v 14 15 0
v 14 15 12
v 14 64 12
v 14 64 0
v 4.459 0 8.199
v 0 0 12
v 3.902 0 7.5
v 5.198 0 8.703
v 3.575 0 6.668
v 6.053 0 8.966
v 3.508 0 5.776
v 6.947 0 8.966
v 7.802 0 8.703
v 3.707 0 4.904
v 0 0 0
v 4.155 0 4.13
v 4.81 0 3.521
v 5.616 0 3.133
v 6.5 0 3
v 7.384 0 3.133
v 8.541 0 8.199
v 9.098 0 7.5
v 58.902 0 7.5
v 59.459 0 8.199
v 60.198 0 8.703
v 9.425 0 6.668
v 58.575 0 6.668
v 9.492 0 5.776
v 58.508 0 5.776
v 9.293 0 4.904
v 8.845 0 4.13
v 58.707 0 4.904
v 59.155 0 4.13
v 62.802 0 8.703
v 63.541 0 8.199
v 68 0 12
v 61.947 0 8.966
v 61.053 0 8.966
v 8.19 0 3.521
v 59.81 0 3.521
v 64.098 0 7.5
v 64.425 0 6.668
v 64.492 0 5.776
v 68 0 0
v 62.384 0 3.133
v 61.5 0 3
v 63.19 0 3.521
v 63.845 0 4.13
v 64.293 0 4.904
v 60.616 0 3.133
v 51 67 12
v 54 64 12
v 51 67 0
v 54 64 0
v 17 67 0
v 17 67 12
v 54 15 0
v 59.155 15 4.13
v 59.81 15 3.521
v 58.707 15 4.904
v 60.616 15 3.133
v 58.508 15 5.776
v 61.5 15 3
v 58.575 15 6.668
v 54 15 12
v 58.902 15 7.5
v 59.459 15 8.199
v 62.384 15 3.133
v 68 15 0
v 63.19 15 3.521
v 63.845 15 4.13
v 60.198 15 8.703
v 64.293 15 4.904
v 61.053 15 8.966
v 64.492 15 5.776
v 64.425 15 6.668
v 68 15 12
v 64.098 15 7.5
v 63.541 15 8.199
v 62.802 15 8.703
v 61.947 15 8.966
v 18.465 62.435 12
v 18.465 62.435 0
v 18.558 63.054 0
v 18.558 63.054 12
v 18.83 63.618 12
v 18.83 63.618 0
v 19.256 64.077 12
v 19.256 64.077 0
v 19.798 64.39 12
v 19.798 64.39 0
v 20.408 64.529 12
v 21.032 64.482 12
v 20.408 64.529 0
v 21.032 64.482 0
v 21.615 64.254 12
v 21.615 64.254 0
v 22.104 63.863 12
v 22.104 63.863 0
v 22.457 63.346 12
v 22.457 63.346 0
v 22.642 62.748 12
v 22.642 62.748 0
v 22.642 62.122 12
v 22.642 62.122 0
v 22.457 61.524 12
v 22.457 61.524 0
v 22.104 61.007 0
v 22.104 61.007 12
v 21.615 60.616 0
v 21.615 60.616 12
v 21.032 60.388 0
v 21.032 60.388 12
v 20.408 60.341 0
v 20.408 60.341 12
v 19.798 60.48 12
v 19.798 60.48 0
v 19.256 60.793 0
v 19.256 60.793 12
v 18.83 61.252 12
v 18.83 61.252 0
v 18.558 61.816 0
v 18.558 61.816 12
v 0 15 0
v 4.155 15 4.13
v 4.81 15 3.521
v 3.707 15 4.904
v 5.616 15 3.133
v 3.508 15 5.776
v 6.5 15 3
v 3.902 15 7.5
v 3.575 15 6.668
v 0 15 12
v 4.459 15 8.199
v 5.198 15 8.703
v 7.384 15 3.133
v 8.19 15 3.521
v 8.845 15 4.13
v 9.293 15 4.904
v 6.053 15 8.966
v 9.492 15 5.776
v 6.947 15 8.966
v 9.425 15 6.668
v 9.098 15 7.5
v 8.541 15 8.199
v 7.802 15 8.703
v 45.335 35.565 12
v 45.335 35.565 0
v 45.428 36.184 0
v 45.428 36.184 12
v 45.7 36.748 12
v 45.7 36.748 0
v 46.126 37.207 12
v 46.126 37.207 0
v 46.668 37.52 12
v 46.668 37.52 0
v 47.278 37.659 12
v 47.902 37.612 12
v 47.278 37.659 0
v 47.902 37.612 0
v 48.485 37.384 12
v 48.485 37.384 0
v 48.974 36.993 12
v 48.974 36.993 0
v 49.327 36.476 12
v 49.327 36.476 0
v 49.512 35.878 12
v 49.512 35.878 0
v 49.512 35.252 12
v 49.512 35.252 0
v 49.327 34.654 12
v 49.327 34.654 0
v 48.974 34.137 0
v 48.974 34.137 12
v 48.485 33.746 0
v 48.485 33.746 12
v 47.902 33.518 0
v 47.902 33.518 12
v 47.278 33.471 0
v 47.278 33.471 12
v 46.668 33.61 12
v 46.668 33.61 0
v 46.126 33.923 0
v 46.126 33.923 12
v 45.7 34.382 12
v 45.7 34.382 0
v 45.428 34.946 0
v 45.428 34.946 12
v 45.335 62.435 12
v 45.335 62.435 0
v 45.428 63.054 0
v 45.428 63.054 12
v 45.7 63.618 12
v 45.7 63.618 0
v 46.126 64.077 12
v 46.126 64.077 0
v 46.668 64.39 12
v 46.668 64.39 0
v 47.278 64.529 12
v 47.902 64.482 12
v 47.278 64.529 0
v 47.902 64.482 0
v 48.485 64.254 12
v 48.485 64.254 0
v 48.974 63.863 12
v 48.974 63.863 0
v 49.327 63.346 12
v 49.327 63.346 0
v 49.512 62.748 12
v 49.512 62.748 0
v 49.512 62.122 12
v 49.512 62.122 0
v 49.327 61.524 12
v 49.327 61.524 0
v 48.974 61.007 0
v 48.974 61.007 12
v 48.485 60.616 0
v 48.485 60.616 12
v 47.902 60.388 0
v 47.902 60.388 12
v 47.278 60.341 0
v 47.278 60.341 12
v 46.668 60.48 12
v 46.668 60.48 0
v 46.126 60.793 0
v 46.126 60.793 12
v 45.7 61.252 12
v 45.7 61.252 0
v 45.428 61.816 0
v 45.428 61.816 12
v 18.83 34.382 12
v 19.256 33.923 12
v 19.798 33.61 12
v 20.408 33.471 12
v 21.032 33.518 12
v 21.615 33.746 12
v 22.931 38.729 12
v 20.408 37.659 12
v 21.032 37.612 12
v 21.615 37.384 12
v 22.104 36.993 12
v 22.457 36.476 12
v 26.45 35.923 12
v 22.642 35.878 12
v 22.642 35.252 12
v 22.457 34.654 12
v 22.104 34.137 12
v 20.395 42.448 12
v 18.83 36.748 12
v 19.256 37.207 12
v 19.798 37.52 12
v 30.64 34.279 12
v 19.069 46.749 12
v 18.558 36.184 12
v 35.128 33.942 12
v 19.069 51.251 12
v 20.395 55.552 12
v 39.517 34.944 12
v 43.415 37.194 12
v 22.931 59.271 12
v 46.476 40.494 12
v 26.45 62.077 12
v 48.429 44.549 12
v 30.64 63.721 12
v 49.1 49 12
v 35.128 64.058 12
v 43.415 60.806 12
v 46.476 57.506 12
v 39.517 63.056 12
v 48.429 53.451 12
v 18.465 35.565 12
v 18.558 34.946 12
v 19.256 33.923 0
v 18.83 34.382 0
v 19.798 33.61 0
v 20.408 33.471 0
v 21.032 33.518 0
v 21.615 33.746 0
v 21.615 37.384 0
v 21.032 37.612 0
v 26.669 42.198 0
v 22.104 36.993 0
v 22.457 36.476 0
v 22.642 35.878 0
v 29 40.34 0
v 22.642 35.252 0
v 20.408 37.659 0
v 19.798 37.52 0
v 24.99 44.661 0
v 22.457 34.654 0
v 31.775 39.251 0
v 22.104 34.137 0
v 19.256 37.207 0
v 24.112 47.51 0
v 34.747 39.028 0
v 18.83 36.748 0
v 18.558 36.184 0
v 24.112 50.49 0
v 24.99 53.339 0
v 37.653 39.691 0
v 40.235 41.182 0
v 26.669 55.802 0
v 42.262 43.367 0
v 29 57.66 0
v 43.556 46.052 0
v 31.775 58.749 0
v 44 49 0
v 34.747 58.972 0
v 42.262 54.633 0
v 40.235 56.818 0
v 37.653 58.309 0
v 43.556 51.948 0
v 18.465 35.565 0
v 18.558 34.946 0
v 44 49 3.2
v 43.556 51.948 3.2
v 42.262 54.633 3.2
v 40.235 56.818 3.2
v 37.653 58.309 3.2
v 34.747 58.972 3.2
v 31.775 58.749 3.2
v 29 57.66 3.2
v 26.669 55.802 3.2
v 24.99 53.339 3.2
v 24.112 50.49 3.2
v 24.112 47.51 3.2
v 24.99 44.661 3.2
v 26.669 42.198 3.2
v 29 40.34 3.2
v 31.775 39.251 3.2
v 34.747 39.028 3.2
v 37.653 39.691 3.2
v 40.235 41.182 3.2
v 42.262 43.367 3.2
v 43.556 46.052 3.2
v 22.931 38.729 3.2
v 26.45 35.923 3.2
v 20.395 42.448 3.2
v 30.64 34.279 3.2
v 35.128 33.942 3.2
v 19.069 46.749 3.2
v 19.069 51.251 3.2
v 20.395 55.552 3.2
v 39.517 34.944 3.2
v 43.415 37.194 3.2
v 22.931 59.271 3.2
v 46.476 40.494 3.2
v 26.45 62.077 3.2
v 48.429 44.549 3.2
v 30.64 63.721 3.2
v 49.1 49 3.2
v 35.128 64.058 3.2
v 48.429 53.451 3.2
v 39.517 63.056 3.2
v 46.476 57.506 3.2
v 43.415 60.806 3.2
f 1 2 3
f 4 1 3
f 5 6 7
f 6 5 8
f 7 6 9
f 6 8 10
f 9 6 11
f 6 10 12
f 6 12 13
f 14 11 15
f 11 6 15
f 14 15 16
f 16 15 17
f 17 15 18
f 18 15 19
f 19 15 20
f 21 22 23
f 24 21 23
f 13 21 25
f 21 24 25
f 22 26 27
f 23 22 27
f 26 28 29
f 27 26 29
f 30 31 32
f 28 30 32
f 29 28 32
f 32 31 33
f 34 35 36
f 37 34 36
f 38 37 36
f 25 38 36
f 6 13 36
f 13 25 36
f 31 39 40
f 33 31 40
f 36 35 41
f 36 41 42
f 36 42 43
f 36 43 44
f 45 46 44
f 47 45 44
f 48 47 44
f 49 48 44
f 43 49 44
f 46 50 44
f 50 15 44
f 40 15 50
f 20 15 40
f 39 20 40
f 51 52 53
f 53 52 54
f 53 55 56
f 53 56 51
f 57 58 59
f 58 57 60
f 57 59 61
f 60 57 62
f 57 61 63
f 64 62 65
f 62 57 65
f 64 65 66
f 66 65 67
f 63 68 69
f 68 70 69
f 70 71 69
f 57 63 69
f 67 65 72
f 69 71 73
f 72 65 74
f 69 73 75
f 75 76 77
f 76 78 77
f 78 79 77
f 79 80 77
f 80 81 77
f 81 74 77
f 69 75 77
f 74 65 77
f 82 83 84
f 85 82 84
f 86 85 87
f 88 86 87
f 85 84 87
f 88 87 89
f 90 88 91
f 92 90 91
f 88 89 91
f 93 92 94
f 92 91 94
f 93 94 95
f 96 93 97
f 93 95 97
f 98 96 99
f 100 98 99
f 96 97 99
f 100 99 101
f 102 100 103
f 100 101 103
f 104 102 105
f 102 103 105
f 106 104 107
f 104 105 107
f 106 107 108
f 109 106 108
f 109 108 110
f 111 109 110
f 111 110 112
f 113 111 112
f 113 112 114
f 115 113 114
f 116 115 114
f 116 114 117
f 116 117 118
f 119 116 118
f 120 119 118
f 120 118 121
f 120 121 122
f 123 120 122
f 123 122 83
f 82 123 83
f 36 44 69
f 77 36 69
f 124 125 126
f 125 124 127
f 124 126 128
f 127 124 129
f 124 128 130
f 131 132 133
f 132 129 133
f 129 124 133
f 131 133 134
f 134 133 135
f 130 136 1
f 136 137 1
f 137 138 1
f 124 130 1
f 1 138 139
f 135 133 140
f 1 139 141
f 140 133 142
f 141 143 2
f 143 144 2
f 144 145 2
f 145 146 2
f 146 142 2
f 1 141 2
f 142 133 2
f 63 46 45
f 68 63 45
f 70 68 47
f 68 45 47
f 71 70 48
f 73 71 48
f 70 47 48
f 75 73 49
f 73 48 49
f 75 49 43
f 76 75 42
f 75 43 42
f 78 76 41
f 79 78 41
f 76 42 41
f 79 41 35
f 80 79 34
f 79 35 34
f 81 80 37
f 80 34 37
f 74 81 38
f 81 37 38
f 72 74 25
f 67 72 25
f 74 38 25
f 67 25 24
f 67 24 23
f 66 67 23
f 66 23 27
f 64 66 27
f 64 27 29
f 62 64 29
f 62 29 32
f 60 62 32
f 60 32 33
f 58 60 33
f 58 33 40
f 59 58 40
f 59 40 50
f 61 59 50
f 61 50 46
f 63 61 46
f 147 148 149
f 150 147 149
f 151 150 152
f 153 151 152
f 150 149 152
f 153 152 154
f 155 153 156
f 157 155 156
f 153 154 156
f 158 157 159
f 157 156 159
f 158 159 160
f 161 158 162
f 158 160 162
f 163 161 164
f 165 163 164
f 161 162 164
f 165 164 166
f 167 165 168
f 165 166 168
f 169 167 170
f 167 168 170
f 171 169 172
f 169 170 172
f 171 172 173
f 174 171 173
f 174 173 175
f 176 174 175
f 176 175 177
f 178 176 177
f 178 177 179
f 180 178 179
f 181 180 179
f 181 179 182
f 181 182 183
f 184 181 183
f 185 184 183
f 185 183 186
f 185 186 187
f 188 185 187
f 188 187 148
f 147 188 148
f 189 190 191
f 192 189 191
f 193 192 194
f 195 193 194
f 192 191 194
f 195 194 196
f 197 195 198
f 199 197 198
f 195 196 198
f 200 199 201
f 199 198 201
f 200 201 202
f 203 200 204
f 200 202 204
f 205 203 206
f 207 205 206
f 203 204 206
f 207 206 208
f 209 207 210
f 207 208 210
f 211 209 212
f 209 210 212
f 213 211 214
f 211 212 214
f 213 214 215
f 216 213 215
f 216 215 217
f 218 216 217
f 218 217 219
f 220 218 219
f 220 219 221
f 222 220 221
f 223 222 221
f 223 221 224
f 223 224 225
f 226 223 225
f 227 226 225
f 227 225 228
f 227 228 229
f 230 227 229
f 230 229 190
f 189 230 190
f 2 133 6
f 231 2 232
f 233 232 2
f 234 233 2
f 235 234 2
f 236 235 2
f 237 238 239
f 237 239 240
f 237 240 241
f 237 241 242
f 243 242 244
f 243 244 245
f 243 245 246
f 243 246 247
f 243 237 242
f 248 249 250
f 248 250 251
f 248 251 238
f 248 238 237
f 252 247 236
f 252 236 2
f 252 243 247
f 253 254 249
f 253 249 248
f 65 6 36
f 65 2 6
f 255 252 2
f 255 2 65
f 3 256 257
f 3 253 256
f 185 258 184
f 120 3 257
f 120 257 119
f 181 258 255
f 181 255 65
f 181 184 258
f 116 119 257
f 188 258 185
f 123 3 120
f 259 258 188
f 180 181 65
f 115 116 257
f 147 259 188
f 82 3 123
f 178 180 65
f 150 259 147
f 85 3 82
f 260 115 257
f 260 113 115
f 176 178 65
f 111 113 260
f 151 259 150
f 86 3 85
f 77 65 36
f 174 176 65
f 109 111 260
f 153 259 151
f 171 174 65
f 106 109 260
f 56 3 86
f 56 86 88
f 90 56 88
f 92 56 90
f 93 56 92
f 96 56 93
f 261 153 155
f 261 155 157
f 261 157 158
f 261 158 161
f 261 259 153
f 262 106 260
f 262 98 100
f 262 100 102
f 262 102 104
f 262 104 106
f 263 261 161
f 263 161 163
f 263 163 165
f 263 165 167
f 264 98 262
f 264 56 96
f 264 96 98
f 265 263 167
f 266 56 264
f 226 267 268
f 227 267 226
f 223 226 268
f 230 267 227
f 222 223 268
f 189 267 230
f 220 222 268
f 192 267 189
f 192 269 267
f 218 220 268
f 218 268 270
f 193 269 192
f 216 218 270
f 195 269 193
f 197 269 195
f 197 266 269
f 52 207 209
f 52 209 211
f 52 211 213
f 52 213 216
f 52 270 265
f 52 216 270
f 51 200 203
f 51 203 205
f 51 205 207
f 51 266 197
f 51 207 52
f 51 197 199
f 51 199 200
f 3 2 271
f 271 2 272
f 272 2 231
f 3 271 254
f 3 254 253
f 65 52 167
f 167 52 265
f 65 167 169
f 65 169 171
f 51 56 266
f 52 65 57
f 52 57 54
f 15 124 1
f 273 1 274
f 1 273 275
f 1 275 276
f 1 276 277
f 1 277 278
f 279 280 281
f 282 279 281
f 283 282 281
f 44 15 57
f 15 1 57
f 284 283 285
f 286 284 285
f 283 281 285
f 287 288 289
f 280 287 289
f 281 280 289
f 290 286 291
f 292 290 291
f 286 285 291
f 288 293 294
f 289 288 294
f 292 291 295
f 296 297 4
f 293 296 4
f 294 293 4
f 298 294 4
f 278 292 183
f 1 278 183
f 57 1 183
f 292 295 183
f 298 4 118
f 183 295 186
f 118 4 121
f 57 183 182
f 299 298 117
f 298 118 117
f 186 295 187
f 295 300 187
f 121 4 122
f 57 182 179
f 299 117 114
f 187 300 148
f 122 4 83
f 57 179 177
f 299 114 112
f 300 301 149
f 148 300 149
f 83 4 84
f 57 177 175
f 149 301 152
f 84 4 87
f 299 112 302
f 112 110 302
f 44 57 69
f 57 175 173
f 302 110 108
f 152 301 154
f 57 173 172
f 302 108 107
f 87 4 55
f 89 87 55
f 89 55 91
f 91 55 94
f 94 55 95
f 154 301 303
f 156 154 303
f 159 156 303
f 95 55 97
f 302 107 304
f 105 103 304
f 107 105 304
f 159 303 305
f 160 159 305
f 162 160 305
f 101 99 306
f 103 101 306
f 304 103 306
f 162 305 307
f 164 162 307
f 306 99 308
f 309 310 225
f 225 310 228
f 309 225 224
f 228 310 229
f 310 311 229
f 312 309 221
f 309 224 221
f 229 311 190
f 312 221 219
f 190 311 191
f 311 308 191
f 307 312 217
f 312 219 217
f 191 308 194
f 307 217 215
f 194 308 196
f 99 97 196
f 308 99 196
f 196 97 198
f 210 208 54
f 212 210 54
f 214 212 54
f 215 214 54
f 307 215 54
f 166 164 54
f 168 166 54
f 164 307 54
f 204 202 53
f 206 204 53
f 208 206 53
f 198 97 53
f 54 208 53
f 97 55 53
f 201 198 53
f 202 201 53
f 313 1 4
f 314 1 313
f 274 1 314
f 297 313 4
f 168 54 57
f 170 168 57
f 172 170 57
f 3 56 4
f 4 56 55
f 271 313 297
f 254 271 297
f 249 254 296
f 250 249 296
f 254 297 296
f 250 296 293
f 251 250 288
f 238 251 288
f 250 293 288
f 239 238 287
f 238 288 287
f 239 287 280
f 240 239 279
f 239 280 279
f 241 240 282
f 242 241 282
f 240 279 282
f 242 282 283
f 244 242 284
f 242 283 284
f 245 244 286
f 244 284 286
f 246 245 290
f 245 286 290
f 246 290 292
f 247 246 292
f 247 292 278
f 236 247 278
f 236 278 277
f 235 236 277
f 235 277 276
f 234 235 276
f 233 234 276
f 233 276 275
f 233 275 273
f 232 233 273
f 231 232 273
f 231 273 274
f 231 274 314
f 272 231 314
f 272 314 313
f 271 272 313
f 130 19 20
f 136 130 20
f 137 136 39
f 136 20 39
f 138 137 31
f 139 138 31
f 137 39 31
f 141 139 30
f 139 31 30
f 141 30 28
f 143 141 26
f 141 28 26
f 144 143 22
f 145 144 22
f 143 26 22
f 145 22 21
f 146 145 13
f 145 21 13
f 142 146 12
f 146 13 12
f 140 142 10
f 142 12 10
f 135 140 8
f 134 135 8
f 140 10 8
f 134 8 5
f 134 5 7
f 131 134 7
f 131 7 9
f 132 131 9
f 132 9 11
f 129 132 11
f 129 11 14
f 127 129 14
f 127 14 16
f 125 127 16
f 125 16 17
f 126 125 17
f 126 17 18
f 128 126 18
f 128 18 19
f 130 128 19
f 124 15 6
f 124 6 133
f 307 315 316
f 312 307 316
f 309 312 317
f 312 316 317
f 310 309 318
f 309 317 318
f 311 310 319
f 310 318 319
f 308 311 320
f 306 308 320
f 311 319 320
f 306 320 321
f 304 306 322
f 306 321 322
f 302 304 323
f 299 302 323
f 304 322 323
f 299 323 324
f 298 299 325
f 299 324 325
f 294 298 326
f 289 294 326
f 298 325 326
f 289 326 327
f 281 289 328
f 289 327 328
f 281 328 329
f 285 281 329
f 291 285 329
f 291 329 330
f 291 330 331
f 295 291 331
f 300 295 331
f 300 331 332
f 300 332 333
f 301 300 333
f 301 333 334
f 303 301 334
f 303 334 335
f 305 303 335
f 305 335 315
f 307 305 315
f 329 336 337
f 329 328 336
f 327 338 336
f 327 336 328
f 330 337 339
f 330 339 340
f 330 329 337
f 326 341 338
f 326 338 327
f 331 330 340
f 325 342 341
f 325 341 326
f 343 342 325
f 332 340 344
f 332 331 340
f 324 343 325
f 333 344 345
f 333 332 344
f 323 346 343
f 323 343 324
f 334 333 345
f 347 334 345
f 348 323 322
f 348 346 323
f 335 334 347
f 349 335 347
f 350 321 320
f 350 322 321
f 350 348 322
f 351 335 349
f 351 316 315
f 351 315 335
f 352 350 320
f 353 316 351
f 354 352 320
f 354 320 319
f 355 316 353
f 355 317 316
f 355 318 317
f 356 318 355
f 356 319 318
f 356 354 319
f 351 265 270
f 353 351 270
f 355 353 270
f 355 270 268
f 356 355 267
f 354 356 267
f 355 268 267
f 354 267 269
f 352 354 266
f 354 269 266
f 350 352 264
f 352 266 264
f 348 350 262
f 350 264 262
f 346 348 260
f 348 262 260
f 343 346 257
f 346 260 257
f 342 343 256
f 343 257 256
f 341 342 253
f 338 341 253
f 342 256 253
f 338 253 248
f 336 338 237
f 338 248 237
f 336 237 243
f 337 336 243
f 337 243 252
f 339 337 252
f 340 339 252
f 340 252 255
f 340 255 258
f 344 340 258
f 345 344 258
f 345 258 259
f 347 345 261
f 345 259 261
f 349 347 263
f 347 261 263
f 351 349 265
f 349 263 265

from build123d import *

# Parameters (mm, degrees)
SKETCH_1_W          = 68
SKETCH_1_H          = 67
EXTRUDE_1_DEPTH     = 12
SKETCH_2_R          = 15.1
CUT_EXTRUDE_1_DEPTH = 8.8
SKETCH_3_R          = 10
CUT_EXTRUDE_2_DEPTH = 96.866782568
HOLE_WIZARD_M5_1_D  = 4.2
SKETCH_7_W          = 14
SKETCH_7_H          = 52
CUT_EXTRUDE_3_DEPTH = 97.213304693
CHAMFER_1_SIZE      = 3
SKETCH_8_R          = 3
CUT_EXTRUDE_4_DEPTH = 97.213304693


with BuildPart() as part:
    # 草图1 → 凸台-拉伸1 (new body)
    with BuildSketch(Plane.XY):
        with Locations((34, 33.5)):
            Rectangle(SKETCH_1_W, SKETCH_1_H)
    extrude(amount=EXTRUDE_1_DEPTH)

    # 草图2 → 切除-拉伸1 (cut)
    with BuildSketch(Plane.XY.offset(12)):
        with Locations((34, 49)):
            Circle(SKETCH_2_R)
    extrude(amount=-CUT_EXTRUDE_1_DEPTH, mode=Mode.SUBTRACT)

    # 草图3 → 切除-拉伸2 (cut, through all)
    with BuildSketch(Plane.XY.offset(3.2)):
        with Locations((34, 49)):
            Circle(SKETCH_3_R)
    extrude(amount=-CUT_EXTRUDE_2_DEPTH, mode=Mode.SUBTRACT)

    # M5 螺纹孔1 (through all)
    with Locations(Plane.XY.offset(12)):
        with Locations((47.435028843, 62.435028843), (20.564971157, 62.435028843), (20.564971157, 35.564971157), (47.435028843, 35.564971157)):
            Hole(HOLE_WIZARD_M5_1_D / 2)

    # 草图7 → 切除-拉伸3 (cut, through all)
    with BuildSketch(Plane.XY.offset(12)):
        with Locations((7, 41)):
            Rectangle(SKETCH_7_W, SKETCH_7_H)
        with Locations((61, 41)):
            Rectangle(SKETCH_7_W, SKETCH_7_H)
    extrude(amount=-CUT_EXTRUDE_3_DEPTH, mode=Mode.SUBTRACT)

    # 倒角1
    chamfer_1_edges = [part.edges().sort_by_distance(p)[0] for p in [
        (14, 67, 6),
        (54, 67, 6),
    ]]
    chamfer(chamfer_1_edges, length=CHAMFER_1_SIZE)

    # 草图8 → 切除-拉伸4 (cut, through all)
    with BuildSketch(Plane.XZ):
        with Locations(Location((6.5, 6, 0), (0, 0, 270))):
            Circle(SKETCH_8_R)
        with Locations(Location((61.5, 6, 0), (0, 0, 270))):
            Circle(SKETCH_8_R)
    extrude(amount=-CUT_EXTRUDE_4_DEPTH, mode=Mode.SUBTRACT)


solid = part.part
